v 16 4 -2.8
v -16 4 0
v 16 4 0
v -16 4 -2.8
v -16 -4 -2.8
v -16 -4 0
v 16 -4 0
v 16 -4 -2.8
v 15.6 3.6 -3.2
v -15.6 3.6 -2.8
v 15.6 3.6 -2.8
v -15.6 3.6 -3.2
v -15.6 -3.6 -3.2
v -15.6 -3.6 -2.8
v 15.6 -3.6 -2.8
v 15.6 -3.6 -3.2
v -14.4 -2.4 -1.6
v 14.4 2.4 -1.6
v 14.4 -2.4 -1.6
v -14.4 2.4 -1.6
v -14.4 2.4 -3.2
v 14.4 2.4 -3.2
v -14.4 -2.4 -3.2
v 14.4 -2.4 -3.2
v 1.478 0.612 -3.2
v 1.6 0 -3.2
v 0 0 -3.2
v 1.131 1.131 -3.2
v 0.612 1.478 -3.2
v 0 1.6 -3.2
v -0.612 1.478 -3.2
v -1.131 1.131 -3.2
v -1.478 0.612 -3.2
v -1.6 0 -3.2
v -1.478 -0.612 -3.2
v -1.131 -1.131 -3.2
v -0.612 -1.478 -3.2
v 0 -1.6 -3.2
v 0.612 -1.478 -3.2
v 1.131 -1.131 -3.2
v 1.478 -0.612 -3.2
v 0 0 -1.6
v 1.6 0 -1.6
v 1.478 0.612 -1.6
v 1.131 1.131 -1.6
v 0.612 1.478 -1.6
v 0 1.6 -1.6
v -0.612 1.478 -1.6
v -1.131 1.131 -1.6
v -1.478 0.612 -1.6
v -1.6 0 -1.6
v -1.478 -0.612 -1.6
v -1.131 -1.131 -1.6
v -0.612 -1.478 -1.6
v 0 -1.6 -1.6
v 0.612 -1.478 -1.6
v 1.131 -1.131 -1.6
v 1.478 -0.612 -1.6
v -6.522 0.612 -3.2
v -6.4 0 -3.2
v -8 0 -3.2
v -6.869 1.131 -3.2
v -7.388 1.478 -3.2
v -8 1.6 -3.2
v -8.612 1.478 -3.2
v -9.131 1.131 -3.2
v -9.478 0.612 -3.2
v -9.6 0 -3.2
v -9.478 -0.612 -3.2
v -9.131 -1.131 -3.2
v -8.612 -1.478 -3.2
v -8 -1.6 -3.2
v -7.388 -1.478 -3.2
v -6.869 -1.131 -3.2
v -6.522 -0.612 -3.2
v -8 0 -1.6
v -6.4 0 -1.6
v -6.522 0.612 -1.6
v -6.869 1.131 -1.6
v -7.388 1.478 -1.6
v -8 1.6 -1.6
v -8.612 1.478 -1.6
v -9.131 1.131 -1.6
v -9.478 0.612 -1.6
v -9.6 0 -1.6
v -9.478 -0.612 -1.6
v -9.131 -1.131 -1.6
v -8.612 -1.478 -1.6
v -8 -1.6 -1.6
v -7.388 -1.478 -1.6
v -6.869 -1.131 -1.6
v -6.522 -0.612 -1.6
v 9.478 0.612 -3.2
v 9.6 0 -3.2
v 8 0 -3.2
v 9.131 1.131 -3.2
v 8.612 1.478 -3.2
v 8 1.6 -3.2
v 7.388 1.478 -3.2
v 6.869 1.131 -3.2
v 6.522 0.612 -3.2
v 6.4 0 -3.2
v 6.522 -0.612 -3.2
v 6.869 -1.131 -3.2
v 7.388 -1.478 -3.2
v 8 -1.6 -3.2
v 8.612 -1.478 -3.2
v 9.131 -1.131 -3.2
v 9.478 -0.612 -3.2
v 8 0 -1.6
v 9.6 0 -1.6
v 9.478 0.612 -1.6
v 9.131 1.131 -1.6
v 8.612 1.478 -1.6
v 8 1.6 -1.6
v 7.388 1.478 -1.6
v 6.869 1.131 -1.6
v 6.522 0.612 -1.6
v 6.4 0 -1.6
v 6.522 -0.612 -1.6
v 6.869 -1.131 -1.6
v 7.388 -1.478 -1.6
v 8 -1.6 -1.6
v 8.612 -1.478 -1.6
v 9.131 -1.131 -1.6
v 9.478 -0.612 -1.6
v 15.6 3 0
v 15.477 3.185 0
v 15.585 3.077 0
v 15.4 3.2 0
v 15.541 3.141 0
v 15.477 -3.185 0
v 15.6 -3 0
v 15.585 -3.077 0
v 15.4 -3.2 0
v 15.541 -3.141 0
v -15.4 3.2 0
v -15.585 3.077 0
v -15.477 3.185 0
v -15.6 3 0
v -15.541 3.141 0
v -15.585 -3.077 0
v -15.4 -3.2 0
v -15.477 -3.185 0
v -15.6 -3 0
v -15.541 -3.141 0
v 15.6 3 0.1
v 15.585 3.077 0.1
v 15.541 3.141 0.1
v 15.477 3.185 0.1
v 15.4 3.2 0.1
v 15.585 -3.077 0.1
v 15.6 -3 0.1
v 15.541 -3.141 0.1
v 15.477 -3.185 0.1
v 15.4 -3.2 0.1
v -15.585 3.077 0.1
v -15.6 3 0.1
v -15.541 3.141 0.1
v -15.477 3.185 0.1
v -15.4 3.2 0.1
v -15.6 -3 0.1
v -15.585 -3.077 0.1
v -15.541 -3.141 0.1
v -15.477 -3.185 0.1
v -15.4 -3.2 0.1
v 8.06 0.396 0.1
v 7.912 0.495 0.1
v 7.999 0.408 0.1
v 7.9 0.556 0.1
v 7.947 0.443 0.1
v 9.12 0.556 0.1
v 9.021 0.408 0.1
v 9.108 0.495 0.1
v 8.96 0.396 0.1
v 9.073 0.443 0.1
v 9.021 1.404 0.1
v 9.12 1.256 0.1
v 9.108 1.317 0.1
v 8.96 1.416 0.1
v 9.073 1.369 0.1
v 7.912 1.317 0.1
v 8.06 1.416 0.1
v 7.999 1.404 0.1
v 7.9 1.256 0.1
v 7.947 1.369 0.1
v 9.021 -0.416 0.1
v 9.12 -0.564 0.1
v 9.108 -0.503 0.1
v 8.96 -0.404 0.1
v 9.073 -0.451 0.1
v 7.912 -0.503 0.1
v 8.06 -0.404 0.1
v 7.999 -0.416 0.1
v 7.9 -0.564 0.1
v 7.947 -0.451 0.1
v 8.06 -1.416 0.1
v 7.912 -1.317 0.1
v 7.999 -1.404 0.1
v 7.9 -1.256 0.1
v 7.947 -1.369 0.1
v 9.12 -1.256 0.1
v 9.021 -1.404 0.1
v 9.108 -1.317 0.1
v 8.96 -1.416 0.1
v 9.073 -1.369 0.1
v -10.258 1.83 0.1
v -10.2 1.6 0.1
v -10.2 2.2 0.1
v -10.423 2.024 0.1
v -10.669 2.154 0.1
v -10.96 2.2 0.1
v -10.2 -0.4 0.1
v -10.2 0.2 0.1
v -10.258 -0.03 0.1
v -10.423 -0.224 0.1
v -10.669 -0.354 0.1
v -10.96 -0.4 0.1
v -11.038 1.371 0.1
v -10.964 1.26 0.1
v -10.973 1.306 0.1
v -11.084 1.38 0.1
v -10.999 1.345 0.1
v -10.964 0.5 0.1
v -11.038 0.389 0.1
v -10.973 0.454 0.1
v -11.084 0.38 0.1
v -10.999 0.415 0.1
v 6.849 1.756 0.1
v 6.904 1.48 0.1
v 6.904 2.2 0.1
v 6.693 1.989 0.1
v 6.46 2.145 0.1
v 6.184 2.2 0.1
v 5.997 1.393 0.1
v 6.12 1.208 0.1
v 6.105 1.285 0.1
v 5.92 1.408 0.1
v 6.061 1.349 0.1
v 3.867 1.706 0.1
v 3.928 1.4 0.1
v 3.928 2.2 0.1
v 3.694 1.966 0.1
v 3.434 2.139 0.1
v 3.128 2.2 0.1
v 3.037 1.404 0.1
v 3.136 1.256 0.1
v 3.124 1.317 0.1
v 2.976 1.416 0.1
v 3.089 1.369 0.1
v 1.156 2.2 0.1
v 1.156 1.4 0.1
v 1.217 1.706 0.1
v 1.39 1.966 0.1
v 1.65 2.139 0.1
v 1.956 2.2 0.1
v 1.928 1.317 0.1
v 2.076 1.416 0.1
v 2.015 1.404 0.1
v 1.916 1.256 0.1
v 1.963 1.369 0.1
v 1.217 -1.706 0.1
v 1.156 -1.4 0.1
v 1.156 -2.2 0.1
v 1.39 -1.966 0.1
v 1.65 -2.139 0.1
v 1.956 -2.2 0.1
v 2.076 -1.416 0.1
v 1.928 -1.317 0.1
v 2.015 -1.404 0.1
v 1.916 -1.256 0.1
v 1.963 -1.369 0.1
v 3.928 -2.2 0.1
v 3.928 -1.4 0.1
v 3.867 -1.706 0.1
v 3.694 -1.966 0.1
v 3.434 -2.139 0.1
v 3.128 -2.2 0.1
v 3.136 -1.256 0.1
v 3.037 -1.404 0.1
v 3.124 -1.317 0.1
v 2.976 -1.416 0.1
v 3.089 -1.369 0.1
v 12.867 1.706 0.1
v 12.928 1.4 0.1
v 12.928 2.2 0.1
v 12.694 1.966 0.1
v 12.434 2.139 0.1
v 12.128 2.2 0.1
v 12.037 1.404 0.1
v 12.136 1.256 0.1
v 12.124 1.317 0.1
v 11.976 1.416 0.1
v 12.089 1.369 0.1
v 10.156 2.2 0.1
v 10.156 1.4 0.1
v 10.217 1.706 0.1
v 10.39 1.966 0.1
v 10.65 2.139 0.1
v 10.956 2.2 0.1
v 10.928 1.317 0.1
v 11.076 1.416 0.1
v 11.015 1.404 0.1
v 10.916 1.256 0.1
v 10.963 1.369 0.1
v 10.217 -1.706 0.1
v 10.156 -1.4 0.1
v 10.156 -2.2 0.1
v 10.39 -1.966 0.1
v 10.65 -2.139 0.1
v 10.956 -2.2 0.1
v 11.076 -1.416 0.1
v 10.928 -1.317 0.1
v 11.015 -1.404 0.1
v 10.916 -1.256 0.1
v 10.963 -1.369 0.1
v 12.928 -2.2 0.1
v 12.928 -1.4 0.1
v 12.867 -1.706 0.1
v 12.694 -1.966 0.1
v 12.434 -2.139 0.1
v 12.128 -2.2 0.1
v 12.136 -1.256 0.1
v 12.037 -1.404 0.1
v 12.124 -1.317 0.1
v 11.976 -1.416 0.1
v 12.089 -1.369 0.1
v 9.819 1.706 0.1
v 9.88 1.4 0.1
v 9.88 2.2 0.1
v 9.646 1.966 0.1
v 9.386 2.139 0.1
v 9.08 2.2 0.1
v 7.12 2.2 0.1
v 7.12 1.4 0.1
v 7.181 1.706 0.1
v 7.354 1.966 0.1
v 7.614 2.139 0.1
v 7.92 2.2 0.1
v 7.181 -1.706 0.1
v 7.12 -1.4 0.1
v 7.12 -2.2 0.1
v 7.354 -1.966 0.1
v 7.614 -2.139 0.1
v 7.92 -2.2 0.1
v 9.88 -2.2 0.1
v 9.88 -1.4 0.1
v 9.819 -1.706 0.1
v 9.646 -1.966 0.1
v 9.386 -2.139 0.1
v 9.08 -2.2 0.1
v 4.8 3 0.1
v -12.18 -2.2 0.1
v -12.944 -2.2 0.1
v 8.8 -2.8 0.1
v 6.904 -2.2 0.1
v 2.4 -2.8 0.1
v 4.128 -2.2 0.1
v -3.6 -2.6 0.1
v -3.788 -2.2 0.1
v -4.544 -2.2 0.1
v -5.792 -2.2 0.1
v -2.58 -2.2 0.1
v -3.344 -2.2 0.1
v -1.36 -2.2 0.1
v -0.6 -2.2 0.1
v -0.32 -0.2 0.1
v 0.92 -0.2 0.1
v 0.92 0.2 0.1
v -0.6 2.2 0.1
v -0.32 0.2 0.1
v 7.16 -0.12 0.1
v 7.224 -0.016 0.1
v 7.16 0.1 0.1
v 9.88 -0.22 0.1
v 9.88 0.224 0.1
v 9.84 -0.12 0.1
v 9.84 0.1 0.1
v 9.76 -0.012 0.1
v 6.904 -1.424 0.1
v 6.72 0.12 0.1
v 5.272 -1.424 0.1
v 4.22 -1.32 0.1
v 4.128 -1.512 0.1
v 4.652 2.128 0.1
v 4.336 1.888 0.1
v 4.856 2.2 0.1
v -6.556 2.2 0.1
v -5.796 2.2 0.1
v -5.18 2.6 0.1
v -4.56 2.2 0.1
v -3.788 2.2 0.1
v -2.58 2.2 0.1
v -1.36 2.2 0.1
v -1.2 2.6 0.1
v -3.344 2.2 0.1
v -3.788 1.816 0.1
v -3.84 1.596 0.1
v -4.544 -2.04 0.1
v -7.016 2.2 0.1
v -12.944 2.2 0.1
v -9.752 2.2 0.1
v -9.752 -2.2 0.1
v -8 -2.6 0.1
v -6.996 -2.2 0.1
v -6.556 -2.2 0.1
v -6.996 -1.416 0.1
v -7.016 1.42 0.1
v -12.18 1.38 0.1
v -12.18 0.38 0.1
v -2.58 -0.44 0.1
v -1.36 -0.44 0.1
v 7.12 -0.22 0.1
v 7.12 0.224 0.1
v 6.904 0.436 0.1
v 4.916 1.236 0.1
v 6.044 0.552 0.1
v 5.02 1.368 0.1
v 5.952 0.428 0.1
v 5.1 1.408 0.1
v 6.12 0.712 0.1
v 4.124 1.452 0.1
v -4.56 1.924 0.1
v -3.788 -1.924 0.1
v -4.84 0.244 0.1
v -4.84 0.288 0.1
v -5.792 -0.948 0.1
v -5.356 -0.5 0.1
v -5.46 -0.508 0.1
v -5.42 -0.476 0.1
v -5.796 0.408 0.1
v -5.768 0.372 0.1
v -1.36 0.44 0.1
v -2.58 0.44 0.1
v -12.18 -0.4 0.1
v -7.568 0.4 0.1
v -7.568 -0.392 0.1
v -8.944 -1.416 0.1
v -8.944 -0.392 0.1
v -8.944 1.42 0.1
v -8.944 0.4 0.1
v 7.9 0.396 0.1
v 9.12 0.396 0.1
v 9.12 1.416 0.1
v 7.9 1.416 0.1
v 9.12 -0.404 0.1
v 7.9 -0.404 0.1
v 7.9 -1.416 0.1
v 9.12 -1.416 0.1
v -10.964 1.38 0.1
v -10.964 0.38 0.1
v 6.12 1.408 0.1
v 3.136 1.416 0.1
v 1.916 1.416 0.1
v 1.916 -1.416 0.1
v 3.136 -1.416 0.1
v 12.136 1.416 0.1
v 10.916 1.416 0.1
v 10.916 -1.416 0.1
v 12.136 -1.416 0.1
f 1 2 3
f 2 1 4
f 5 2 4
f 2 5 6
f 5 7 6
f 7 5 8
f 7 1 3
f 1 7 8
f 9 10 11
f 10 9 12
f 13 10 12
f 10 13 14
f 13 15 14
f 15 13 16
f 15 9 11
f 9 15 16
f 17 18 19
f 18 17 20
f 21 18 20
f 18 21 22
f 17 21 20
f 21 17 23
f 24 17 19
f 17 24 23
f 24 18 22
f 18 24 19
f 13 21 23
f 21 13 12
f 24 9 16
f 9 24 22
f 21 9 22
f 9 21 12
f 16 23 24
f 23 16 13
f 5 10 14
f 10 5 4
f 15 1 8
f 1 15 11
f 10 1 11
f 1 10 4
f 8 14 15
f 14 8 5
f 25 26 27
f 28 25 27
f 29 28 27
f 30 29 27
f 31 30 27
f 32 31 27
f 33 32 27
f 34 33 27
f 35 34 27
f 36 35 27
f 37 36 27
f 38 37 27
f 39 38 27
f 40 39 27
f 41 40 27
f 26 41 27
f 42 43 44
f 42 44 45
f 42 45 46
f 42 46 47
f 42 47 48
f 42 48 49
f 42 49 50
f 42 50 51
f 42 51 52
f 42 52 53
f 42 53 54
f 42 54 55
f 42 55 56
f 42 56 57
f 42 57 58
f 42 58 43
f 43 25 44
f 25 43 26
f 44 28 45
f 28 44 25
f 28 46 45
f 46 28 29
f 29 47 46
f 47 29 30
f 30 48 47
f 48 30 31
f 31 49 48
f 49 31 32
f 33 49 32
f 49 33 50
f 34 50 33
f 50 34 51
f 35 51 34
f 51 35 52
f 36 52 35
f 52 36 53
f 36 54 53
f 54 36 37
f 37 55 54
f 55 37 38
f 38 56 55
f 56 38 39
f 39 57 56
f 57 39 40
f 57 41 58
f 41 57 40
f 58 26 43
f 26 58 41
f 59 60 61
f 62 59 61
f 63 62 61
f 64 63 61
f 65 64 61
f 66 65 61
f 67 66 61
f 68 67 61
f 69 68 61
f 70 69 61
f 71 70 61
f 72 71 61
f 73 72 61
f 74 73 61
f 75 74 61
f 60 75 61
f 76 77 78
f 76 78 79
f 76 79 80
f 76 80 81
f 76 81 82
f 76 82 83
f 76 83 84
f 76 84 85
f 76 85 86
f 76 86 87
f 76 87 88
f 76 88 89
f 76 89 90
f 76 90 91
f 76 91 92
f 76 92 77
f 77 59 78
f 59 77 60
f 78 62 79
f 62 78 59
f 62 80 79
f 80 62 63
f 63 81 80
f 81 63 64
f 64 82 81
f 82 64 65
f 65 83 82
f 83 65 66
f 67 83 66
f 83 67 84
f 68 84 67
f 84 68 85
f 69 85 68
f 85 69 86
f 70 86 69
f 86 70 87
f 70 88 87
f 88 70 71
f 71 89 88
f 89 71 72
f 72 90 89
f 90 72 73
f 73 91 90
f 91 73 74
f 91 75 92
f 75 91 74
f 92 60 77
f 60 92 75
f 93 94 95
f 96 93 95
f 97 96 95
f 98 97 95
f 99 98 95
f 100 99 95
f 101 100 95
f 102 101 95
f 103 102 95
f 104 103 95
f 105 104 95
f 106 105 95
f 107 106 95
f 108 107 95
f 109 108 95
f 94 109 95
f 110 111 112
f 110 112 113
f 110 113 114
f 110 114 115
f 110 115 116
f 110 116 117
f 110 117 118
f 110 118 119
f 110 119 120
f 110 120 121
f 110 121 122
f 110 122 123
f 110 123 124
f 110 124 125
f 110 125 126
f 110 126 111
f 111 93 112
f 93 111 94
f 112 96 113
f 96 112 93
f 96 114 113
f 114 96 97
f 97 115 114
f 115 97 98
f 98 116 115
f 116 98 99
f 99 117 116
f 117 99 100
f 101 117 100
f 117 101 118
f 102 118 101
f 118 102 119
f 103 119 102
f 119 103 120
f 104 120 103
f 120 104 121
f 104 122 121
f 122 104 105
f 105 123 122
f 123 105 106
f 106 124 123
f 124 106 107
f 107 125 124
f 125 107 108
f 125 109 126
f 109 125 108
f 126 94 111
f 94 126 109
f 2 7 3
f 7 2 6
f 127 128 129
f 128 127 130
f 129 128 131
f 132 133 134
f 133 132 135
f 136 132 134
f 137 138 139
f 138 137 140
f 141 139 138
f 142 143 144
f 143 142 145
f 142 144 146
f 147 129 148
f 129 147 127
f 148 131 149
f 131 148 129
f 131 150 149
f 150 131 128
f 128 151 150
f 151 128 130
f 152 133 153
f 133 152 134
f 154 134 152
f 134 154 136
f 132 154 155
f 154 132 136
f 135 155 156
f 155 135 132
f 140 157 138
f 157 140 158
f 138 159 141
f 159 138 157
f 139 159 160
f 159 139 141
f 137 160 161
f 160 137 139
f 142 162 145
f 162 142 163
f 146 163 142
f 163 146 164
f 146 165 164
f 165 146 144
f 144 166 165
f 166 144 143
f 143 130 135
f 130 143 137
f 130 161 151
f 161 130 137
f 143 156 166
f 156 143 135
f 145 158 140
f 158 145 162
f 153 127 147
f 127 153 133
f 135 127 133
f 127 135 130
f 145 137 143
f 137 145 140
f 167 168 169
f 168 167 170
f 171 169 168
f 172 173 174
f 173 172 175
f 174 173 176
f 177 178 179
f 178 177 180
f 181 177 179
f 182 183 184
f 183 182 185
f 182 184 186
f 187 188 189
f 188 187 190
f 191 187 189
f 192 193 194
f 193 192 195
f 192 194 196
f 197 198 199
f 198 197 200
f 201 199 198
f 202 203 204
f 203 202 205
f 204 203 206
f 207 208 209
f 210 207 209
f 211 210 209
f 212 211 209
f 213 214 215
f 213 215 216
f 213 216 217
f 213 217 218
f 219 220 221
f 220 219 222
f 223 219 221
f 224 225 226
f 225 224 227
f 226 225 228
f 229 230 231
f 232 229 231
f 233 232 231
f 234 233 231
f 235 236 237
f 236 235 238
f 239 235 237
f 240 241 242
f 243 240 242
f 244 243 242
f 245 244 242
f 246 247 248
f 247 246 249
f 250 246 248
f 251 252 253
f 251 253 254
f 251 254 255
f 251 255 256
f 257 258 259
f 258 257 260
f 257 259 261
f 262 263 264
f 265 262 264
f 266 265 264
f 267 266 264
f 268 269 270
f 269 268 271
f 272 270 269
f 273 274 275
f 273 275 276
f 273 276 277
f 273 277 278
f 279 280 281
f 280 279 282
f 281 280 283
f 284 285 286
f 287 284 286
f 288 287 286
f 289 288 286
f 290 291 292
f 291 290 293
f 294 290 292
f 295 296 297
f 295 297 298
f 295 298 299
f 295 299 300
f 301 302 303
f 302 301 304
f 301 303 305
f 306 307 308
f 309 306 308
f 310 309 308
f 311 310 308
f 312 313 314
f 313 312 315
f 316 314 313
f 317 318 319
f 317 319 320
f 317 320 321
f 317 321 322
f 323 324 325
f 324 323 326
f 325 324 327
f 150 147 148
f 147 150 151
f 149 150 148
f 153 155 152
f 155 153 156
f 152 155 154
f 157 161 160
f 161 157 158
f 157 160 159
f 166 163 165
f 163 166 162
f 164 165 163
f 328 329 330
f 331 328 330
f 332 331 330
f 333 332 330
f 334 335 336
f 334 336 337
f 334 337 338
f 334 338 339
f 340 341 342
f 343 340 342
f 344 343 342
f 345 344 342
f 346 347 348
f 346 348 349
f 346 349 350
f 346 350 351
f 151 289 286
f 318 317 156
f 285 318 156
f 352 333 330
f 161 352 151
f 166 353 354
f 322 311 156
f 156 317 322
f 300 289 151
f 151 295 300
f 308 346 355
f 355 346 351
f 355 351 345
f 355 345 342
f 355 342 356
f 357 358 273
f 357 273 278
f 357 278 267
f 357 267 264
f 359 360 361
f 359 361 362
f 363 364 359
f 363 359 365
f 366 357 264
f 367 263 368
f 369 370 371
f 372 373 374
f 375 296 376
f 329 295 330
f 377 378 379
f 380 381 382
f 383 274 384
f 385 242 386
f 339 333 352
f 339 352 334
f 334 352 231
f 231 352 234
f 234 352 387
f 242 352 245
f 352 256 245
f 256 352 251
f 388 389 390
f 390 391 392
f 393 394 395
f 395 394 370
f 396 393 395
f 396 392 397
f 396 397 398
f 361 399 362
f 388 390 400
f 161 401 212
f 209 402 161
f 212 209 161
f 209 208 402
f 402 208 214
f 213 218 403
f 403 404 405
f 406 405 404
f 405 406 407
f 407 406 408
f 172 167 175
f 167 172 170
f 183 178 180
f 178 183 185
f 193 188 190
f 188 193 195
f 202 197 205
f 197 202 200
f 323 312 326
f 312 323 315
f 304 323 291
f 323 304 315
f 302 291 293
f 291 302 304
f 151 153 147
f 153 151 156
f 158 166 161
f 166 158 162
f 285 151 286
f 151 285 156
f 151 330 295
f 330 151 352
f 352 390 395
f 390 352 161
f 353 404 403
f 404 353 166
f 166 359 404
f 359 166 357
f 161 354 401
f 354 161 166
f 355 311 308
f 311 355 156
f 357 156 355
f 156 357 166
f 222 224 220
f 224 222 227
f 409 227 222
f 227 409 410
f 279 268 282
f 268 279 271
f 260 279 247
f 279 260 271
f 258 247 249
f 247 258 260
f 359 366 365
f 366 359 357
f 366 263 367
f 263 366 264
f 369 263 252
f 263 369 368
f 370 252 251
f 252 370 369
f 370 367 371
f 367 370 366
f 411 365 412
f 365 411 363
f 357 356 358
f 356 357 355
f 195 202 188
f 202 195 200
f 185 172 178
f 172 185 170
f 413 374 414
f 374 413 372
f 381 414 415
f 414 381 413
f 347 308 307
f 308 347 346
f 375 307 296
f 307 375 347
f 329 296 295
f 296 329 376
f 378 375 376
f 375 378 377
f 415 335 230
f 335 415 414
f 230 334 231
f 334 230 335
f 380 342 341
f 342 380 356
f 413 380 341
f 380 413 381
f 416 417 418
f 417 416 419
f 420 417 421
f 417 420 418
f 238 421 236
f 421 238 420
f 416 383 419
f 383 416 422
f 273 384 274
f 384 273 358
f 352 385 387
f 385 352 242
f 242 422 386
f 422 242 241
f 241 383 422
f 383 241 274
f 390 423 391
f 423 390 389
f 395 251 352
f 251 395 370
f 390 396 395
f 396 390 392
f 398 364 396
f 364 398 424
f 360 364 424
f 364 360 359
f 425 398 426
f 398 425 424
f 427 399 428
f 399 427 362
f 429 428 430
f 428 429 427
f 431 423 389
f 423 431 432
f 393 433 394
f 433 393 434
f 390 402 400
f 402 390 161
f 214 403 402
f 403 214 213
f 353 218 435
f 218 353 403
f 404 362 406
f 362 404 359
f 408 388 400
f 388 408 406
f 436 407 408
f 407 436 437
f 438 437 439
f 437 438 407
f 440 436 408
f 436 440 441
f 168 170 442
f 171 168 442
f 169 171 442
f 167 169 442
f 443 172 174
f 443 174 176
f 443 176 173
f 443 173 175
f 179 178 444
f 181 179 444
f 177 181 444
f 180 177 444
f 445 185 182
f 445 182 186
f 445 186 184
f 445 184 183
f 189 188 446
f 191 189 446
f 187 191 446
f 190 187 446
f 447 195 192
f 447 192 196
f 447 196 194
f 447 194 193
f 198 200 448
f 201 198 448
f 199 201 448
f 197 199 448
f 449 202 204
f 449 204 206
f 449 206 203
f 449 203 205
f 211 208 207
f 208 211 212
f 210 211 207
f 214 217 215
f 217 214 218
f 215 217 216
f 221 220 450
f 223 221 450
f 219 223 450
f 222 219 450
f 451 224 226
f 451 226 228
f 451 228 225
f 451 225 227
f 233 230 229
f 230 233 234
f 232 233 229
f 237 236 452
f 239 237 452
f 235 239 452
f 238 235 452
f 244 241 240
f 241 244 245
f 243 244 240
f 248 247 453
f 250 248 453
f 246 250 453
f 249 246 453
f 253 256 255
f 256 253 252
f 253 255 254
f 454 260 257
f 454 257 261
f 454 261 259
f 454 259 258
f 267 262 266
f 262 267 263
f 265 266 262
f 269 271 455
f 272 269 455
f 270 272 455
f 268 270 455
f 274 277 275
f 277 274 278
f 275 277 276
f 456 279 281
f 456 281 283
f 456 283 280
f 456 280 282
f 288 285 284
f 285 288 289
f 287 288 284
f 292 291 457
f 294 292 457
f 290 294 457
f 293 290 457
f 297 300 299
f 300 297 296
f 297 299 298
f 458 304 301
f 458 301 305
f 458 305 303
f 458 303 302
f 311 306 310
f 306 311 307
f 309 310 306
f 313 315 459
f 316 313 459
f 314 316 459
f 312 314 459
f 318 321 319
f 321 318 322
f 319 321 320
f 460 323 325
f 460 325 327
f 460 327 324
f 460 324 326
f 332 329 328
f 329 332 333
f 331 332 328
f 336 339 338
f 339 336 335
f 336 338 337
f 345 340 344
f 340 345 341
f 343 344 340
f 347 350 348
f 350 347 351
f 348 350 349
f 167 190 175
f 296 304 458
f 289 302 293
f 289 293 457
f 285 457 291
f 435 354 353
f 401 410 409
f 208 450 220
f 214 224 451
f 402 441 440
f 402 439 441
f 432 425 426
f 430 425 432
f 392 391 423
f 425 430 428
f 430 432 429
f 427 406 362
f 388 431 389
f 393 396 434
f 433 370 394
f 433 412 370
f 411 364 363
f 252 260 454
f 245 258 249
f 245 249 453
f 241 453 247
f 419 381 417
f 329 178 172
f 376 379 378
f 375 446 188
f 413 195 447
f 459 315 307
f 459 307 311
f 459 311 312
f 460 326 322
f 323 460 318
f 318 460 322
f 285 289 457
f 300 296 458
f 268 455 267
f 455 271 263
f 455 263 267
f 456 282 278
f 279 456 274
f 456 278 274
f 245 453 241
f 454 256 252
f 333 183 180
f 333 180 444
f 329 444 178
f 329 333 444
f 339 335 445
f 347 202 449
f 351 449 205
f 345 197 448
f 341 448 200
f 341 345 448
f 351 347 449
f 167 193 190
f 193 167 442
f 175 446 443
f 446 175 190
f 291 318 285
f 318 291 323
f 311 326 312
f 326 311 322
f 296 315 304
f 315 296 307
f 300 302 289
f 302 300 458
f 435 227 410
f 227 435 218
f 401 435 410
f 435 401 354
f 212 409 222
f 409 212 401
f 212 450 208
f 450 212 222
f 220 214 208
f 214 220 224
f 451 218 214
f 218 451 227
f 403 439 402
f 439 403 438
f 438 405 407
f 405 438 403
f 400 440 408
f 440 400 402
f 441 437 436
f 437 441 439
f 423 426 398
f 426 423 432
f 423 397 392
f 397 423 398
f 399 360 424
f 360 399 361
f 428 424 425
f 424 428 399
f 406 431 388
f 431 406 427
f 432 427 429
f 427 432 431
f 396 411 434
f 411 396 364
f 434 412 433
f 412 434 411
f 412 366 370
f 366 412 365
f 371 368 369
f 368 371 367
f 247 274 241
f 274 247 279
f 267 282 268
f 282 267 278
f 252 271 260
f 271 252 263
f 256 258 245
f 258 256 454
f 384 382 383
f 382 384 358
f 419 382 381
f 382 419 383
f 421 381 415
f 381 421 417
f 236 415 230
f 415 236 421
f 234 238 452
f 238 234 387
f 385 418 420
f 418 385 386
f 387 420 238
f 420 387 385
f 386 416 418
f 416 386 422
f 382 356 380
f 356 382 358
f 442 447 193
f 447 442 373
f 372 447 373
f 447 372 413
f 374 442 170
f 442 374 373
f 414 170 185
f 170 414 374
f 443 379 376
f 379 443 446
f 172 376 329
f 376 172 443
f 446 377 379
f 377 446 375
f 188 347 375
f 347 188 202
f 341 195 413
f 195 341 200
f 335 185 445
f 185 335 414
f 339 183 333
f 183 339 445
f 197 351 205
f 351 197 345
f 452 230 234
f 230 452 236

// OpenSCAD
use <../lib.scad>
use <2431.scad>
use <6258203j.scad>
function ldraw_lib__2431dt4() = [
// 0 Tile  1 x  4 with White License Plate "PEKH-0280" Sticker
// 0 Name: 2431dt4.dat
// 0 Author: Ulrich Röder [UR]
// 0 !LDRAW_ORG Shortcut UPDATE 2024-04
// 0 !LICENSE Licensed under CC BY 4.0 : see CAreadme.txt
// 
// 0 BFC CERTIFY CCW
  [0,"BFC","CERTIFY"],
  [0,"BFC","CCW"],
// 
// 0 !CATEGORY Sticker Shortcut
// 0 !KEYWORDS Ford, Mustang, Set 10265
// 
// 0 !HISTORY 2019-06-28 [PTadmin] Official Update 2019-01
// 0 !HISTORY 2024-05-27 [OrionP] Change category to Sticker Shortcut
// 0 !HISTORY 2024-05-28 [OrionP] Official Update 2024-04
// 
// 
// 1 16 0 0 0 1 0 0 0 1 0 0 0 1 2431.dat
  [1,16,0,0,0,1,0,0,0,1,0,0,0,1, ldraw_lib__2431()],
// 1 16 0 0 0 1 0 0 0 1 0 0 0 1 6258203j.dat
  [1,16,0,0,0,1,0,0,0,1,0,0,0,1, ldraw_lib__6258203j()],
];
module ldraw_lib__2431dt4(step=0, col=false, unit=2/5, alt=false, line=0.2, solid=!$preview)
    makepoly(ldraw_lib__2431dt4(), step=step, col=col, unit=unit, alt=alt, line=line, solid=solid);
ldraw_lib__2431dt4(line=0.2);
